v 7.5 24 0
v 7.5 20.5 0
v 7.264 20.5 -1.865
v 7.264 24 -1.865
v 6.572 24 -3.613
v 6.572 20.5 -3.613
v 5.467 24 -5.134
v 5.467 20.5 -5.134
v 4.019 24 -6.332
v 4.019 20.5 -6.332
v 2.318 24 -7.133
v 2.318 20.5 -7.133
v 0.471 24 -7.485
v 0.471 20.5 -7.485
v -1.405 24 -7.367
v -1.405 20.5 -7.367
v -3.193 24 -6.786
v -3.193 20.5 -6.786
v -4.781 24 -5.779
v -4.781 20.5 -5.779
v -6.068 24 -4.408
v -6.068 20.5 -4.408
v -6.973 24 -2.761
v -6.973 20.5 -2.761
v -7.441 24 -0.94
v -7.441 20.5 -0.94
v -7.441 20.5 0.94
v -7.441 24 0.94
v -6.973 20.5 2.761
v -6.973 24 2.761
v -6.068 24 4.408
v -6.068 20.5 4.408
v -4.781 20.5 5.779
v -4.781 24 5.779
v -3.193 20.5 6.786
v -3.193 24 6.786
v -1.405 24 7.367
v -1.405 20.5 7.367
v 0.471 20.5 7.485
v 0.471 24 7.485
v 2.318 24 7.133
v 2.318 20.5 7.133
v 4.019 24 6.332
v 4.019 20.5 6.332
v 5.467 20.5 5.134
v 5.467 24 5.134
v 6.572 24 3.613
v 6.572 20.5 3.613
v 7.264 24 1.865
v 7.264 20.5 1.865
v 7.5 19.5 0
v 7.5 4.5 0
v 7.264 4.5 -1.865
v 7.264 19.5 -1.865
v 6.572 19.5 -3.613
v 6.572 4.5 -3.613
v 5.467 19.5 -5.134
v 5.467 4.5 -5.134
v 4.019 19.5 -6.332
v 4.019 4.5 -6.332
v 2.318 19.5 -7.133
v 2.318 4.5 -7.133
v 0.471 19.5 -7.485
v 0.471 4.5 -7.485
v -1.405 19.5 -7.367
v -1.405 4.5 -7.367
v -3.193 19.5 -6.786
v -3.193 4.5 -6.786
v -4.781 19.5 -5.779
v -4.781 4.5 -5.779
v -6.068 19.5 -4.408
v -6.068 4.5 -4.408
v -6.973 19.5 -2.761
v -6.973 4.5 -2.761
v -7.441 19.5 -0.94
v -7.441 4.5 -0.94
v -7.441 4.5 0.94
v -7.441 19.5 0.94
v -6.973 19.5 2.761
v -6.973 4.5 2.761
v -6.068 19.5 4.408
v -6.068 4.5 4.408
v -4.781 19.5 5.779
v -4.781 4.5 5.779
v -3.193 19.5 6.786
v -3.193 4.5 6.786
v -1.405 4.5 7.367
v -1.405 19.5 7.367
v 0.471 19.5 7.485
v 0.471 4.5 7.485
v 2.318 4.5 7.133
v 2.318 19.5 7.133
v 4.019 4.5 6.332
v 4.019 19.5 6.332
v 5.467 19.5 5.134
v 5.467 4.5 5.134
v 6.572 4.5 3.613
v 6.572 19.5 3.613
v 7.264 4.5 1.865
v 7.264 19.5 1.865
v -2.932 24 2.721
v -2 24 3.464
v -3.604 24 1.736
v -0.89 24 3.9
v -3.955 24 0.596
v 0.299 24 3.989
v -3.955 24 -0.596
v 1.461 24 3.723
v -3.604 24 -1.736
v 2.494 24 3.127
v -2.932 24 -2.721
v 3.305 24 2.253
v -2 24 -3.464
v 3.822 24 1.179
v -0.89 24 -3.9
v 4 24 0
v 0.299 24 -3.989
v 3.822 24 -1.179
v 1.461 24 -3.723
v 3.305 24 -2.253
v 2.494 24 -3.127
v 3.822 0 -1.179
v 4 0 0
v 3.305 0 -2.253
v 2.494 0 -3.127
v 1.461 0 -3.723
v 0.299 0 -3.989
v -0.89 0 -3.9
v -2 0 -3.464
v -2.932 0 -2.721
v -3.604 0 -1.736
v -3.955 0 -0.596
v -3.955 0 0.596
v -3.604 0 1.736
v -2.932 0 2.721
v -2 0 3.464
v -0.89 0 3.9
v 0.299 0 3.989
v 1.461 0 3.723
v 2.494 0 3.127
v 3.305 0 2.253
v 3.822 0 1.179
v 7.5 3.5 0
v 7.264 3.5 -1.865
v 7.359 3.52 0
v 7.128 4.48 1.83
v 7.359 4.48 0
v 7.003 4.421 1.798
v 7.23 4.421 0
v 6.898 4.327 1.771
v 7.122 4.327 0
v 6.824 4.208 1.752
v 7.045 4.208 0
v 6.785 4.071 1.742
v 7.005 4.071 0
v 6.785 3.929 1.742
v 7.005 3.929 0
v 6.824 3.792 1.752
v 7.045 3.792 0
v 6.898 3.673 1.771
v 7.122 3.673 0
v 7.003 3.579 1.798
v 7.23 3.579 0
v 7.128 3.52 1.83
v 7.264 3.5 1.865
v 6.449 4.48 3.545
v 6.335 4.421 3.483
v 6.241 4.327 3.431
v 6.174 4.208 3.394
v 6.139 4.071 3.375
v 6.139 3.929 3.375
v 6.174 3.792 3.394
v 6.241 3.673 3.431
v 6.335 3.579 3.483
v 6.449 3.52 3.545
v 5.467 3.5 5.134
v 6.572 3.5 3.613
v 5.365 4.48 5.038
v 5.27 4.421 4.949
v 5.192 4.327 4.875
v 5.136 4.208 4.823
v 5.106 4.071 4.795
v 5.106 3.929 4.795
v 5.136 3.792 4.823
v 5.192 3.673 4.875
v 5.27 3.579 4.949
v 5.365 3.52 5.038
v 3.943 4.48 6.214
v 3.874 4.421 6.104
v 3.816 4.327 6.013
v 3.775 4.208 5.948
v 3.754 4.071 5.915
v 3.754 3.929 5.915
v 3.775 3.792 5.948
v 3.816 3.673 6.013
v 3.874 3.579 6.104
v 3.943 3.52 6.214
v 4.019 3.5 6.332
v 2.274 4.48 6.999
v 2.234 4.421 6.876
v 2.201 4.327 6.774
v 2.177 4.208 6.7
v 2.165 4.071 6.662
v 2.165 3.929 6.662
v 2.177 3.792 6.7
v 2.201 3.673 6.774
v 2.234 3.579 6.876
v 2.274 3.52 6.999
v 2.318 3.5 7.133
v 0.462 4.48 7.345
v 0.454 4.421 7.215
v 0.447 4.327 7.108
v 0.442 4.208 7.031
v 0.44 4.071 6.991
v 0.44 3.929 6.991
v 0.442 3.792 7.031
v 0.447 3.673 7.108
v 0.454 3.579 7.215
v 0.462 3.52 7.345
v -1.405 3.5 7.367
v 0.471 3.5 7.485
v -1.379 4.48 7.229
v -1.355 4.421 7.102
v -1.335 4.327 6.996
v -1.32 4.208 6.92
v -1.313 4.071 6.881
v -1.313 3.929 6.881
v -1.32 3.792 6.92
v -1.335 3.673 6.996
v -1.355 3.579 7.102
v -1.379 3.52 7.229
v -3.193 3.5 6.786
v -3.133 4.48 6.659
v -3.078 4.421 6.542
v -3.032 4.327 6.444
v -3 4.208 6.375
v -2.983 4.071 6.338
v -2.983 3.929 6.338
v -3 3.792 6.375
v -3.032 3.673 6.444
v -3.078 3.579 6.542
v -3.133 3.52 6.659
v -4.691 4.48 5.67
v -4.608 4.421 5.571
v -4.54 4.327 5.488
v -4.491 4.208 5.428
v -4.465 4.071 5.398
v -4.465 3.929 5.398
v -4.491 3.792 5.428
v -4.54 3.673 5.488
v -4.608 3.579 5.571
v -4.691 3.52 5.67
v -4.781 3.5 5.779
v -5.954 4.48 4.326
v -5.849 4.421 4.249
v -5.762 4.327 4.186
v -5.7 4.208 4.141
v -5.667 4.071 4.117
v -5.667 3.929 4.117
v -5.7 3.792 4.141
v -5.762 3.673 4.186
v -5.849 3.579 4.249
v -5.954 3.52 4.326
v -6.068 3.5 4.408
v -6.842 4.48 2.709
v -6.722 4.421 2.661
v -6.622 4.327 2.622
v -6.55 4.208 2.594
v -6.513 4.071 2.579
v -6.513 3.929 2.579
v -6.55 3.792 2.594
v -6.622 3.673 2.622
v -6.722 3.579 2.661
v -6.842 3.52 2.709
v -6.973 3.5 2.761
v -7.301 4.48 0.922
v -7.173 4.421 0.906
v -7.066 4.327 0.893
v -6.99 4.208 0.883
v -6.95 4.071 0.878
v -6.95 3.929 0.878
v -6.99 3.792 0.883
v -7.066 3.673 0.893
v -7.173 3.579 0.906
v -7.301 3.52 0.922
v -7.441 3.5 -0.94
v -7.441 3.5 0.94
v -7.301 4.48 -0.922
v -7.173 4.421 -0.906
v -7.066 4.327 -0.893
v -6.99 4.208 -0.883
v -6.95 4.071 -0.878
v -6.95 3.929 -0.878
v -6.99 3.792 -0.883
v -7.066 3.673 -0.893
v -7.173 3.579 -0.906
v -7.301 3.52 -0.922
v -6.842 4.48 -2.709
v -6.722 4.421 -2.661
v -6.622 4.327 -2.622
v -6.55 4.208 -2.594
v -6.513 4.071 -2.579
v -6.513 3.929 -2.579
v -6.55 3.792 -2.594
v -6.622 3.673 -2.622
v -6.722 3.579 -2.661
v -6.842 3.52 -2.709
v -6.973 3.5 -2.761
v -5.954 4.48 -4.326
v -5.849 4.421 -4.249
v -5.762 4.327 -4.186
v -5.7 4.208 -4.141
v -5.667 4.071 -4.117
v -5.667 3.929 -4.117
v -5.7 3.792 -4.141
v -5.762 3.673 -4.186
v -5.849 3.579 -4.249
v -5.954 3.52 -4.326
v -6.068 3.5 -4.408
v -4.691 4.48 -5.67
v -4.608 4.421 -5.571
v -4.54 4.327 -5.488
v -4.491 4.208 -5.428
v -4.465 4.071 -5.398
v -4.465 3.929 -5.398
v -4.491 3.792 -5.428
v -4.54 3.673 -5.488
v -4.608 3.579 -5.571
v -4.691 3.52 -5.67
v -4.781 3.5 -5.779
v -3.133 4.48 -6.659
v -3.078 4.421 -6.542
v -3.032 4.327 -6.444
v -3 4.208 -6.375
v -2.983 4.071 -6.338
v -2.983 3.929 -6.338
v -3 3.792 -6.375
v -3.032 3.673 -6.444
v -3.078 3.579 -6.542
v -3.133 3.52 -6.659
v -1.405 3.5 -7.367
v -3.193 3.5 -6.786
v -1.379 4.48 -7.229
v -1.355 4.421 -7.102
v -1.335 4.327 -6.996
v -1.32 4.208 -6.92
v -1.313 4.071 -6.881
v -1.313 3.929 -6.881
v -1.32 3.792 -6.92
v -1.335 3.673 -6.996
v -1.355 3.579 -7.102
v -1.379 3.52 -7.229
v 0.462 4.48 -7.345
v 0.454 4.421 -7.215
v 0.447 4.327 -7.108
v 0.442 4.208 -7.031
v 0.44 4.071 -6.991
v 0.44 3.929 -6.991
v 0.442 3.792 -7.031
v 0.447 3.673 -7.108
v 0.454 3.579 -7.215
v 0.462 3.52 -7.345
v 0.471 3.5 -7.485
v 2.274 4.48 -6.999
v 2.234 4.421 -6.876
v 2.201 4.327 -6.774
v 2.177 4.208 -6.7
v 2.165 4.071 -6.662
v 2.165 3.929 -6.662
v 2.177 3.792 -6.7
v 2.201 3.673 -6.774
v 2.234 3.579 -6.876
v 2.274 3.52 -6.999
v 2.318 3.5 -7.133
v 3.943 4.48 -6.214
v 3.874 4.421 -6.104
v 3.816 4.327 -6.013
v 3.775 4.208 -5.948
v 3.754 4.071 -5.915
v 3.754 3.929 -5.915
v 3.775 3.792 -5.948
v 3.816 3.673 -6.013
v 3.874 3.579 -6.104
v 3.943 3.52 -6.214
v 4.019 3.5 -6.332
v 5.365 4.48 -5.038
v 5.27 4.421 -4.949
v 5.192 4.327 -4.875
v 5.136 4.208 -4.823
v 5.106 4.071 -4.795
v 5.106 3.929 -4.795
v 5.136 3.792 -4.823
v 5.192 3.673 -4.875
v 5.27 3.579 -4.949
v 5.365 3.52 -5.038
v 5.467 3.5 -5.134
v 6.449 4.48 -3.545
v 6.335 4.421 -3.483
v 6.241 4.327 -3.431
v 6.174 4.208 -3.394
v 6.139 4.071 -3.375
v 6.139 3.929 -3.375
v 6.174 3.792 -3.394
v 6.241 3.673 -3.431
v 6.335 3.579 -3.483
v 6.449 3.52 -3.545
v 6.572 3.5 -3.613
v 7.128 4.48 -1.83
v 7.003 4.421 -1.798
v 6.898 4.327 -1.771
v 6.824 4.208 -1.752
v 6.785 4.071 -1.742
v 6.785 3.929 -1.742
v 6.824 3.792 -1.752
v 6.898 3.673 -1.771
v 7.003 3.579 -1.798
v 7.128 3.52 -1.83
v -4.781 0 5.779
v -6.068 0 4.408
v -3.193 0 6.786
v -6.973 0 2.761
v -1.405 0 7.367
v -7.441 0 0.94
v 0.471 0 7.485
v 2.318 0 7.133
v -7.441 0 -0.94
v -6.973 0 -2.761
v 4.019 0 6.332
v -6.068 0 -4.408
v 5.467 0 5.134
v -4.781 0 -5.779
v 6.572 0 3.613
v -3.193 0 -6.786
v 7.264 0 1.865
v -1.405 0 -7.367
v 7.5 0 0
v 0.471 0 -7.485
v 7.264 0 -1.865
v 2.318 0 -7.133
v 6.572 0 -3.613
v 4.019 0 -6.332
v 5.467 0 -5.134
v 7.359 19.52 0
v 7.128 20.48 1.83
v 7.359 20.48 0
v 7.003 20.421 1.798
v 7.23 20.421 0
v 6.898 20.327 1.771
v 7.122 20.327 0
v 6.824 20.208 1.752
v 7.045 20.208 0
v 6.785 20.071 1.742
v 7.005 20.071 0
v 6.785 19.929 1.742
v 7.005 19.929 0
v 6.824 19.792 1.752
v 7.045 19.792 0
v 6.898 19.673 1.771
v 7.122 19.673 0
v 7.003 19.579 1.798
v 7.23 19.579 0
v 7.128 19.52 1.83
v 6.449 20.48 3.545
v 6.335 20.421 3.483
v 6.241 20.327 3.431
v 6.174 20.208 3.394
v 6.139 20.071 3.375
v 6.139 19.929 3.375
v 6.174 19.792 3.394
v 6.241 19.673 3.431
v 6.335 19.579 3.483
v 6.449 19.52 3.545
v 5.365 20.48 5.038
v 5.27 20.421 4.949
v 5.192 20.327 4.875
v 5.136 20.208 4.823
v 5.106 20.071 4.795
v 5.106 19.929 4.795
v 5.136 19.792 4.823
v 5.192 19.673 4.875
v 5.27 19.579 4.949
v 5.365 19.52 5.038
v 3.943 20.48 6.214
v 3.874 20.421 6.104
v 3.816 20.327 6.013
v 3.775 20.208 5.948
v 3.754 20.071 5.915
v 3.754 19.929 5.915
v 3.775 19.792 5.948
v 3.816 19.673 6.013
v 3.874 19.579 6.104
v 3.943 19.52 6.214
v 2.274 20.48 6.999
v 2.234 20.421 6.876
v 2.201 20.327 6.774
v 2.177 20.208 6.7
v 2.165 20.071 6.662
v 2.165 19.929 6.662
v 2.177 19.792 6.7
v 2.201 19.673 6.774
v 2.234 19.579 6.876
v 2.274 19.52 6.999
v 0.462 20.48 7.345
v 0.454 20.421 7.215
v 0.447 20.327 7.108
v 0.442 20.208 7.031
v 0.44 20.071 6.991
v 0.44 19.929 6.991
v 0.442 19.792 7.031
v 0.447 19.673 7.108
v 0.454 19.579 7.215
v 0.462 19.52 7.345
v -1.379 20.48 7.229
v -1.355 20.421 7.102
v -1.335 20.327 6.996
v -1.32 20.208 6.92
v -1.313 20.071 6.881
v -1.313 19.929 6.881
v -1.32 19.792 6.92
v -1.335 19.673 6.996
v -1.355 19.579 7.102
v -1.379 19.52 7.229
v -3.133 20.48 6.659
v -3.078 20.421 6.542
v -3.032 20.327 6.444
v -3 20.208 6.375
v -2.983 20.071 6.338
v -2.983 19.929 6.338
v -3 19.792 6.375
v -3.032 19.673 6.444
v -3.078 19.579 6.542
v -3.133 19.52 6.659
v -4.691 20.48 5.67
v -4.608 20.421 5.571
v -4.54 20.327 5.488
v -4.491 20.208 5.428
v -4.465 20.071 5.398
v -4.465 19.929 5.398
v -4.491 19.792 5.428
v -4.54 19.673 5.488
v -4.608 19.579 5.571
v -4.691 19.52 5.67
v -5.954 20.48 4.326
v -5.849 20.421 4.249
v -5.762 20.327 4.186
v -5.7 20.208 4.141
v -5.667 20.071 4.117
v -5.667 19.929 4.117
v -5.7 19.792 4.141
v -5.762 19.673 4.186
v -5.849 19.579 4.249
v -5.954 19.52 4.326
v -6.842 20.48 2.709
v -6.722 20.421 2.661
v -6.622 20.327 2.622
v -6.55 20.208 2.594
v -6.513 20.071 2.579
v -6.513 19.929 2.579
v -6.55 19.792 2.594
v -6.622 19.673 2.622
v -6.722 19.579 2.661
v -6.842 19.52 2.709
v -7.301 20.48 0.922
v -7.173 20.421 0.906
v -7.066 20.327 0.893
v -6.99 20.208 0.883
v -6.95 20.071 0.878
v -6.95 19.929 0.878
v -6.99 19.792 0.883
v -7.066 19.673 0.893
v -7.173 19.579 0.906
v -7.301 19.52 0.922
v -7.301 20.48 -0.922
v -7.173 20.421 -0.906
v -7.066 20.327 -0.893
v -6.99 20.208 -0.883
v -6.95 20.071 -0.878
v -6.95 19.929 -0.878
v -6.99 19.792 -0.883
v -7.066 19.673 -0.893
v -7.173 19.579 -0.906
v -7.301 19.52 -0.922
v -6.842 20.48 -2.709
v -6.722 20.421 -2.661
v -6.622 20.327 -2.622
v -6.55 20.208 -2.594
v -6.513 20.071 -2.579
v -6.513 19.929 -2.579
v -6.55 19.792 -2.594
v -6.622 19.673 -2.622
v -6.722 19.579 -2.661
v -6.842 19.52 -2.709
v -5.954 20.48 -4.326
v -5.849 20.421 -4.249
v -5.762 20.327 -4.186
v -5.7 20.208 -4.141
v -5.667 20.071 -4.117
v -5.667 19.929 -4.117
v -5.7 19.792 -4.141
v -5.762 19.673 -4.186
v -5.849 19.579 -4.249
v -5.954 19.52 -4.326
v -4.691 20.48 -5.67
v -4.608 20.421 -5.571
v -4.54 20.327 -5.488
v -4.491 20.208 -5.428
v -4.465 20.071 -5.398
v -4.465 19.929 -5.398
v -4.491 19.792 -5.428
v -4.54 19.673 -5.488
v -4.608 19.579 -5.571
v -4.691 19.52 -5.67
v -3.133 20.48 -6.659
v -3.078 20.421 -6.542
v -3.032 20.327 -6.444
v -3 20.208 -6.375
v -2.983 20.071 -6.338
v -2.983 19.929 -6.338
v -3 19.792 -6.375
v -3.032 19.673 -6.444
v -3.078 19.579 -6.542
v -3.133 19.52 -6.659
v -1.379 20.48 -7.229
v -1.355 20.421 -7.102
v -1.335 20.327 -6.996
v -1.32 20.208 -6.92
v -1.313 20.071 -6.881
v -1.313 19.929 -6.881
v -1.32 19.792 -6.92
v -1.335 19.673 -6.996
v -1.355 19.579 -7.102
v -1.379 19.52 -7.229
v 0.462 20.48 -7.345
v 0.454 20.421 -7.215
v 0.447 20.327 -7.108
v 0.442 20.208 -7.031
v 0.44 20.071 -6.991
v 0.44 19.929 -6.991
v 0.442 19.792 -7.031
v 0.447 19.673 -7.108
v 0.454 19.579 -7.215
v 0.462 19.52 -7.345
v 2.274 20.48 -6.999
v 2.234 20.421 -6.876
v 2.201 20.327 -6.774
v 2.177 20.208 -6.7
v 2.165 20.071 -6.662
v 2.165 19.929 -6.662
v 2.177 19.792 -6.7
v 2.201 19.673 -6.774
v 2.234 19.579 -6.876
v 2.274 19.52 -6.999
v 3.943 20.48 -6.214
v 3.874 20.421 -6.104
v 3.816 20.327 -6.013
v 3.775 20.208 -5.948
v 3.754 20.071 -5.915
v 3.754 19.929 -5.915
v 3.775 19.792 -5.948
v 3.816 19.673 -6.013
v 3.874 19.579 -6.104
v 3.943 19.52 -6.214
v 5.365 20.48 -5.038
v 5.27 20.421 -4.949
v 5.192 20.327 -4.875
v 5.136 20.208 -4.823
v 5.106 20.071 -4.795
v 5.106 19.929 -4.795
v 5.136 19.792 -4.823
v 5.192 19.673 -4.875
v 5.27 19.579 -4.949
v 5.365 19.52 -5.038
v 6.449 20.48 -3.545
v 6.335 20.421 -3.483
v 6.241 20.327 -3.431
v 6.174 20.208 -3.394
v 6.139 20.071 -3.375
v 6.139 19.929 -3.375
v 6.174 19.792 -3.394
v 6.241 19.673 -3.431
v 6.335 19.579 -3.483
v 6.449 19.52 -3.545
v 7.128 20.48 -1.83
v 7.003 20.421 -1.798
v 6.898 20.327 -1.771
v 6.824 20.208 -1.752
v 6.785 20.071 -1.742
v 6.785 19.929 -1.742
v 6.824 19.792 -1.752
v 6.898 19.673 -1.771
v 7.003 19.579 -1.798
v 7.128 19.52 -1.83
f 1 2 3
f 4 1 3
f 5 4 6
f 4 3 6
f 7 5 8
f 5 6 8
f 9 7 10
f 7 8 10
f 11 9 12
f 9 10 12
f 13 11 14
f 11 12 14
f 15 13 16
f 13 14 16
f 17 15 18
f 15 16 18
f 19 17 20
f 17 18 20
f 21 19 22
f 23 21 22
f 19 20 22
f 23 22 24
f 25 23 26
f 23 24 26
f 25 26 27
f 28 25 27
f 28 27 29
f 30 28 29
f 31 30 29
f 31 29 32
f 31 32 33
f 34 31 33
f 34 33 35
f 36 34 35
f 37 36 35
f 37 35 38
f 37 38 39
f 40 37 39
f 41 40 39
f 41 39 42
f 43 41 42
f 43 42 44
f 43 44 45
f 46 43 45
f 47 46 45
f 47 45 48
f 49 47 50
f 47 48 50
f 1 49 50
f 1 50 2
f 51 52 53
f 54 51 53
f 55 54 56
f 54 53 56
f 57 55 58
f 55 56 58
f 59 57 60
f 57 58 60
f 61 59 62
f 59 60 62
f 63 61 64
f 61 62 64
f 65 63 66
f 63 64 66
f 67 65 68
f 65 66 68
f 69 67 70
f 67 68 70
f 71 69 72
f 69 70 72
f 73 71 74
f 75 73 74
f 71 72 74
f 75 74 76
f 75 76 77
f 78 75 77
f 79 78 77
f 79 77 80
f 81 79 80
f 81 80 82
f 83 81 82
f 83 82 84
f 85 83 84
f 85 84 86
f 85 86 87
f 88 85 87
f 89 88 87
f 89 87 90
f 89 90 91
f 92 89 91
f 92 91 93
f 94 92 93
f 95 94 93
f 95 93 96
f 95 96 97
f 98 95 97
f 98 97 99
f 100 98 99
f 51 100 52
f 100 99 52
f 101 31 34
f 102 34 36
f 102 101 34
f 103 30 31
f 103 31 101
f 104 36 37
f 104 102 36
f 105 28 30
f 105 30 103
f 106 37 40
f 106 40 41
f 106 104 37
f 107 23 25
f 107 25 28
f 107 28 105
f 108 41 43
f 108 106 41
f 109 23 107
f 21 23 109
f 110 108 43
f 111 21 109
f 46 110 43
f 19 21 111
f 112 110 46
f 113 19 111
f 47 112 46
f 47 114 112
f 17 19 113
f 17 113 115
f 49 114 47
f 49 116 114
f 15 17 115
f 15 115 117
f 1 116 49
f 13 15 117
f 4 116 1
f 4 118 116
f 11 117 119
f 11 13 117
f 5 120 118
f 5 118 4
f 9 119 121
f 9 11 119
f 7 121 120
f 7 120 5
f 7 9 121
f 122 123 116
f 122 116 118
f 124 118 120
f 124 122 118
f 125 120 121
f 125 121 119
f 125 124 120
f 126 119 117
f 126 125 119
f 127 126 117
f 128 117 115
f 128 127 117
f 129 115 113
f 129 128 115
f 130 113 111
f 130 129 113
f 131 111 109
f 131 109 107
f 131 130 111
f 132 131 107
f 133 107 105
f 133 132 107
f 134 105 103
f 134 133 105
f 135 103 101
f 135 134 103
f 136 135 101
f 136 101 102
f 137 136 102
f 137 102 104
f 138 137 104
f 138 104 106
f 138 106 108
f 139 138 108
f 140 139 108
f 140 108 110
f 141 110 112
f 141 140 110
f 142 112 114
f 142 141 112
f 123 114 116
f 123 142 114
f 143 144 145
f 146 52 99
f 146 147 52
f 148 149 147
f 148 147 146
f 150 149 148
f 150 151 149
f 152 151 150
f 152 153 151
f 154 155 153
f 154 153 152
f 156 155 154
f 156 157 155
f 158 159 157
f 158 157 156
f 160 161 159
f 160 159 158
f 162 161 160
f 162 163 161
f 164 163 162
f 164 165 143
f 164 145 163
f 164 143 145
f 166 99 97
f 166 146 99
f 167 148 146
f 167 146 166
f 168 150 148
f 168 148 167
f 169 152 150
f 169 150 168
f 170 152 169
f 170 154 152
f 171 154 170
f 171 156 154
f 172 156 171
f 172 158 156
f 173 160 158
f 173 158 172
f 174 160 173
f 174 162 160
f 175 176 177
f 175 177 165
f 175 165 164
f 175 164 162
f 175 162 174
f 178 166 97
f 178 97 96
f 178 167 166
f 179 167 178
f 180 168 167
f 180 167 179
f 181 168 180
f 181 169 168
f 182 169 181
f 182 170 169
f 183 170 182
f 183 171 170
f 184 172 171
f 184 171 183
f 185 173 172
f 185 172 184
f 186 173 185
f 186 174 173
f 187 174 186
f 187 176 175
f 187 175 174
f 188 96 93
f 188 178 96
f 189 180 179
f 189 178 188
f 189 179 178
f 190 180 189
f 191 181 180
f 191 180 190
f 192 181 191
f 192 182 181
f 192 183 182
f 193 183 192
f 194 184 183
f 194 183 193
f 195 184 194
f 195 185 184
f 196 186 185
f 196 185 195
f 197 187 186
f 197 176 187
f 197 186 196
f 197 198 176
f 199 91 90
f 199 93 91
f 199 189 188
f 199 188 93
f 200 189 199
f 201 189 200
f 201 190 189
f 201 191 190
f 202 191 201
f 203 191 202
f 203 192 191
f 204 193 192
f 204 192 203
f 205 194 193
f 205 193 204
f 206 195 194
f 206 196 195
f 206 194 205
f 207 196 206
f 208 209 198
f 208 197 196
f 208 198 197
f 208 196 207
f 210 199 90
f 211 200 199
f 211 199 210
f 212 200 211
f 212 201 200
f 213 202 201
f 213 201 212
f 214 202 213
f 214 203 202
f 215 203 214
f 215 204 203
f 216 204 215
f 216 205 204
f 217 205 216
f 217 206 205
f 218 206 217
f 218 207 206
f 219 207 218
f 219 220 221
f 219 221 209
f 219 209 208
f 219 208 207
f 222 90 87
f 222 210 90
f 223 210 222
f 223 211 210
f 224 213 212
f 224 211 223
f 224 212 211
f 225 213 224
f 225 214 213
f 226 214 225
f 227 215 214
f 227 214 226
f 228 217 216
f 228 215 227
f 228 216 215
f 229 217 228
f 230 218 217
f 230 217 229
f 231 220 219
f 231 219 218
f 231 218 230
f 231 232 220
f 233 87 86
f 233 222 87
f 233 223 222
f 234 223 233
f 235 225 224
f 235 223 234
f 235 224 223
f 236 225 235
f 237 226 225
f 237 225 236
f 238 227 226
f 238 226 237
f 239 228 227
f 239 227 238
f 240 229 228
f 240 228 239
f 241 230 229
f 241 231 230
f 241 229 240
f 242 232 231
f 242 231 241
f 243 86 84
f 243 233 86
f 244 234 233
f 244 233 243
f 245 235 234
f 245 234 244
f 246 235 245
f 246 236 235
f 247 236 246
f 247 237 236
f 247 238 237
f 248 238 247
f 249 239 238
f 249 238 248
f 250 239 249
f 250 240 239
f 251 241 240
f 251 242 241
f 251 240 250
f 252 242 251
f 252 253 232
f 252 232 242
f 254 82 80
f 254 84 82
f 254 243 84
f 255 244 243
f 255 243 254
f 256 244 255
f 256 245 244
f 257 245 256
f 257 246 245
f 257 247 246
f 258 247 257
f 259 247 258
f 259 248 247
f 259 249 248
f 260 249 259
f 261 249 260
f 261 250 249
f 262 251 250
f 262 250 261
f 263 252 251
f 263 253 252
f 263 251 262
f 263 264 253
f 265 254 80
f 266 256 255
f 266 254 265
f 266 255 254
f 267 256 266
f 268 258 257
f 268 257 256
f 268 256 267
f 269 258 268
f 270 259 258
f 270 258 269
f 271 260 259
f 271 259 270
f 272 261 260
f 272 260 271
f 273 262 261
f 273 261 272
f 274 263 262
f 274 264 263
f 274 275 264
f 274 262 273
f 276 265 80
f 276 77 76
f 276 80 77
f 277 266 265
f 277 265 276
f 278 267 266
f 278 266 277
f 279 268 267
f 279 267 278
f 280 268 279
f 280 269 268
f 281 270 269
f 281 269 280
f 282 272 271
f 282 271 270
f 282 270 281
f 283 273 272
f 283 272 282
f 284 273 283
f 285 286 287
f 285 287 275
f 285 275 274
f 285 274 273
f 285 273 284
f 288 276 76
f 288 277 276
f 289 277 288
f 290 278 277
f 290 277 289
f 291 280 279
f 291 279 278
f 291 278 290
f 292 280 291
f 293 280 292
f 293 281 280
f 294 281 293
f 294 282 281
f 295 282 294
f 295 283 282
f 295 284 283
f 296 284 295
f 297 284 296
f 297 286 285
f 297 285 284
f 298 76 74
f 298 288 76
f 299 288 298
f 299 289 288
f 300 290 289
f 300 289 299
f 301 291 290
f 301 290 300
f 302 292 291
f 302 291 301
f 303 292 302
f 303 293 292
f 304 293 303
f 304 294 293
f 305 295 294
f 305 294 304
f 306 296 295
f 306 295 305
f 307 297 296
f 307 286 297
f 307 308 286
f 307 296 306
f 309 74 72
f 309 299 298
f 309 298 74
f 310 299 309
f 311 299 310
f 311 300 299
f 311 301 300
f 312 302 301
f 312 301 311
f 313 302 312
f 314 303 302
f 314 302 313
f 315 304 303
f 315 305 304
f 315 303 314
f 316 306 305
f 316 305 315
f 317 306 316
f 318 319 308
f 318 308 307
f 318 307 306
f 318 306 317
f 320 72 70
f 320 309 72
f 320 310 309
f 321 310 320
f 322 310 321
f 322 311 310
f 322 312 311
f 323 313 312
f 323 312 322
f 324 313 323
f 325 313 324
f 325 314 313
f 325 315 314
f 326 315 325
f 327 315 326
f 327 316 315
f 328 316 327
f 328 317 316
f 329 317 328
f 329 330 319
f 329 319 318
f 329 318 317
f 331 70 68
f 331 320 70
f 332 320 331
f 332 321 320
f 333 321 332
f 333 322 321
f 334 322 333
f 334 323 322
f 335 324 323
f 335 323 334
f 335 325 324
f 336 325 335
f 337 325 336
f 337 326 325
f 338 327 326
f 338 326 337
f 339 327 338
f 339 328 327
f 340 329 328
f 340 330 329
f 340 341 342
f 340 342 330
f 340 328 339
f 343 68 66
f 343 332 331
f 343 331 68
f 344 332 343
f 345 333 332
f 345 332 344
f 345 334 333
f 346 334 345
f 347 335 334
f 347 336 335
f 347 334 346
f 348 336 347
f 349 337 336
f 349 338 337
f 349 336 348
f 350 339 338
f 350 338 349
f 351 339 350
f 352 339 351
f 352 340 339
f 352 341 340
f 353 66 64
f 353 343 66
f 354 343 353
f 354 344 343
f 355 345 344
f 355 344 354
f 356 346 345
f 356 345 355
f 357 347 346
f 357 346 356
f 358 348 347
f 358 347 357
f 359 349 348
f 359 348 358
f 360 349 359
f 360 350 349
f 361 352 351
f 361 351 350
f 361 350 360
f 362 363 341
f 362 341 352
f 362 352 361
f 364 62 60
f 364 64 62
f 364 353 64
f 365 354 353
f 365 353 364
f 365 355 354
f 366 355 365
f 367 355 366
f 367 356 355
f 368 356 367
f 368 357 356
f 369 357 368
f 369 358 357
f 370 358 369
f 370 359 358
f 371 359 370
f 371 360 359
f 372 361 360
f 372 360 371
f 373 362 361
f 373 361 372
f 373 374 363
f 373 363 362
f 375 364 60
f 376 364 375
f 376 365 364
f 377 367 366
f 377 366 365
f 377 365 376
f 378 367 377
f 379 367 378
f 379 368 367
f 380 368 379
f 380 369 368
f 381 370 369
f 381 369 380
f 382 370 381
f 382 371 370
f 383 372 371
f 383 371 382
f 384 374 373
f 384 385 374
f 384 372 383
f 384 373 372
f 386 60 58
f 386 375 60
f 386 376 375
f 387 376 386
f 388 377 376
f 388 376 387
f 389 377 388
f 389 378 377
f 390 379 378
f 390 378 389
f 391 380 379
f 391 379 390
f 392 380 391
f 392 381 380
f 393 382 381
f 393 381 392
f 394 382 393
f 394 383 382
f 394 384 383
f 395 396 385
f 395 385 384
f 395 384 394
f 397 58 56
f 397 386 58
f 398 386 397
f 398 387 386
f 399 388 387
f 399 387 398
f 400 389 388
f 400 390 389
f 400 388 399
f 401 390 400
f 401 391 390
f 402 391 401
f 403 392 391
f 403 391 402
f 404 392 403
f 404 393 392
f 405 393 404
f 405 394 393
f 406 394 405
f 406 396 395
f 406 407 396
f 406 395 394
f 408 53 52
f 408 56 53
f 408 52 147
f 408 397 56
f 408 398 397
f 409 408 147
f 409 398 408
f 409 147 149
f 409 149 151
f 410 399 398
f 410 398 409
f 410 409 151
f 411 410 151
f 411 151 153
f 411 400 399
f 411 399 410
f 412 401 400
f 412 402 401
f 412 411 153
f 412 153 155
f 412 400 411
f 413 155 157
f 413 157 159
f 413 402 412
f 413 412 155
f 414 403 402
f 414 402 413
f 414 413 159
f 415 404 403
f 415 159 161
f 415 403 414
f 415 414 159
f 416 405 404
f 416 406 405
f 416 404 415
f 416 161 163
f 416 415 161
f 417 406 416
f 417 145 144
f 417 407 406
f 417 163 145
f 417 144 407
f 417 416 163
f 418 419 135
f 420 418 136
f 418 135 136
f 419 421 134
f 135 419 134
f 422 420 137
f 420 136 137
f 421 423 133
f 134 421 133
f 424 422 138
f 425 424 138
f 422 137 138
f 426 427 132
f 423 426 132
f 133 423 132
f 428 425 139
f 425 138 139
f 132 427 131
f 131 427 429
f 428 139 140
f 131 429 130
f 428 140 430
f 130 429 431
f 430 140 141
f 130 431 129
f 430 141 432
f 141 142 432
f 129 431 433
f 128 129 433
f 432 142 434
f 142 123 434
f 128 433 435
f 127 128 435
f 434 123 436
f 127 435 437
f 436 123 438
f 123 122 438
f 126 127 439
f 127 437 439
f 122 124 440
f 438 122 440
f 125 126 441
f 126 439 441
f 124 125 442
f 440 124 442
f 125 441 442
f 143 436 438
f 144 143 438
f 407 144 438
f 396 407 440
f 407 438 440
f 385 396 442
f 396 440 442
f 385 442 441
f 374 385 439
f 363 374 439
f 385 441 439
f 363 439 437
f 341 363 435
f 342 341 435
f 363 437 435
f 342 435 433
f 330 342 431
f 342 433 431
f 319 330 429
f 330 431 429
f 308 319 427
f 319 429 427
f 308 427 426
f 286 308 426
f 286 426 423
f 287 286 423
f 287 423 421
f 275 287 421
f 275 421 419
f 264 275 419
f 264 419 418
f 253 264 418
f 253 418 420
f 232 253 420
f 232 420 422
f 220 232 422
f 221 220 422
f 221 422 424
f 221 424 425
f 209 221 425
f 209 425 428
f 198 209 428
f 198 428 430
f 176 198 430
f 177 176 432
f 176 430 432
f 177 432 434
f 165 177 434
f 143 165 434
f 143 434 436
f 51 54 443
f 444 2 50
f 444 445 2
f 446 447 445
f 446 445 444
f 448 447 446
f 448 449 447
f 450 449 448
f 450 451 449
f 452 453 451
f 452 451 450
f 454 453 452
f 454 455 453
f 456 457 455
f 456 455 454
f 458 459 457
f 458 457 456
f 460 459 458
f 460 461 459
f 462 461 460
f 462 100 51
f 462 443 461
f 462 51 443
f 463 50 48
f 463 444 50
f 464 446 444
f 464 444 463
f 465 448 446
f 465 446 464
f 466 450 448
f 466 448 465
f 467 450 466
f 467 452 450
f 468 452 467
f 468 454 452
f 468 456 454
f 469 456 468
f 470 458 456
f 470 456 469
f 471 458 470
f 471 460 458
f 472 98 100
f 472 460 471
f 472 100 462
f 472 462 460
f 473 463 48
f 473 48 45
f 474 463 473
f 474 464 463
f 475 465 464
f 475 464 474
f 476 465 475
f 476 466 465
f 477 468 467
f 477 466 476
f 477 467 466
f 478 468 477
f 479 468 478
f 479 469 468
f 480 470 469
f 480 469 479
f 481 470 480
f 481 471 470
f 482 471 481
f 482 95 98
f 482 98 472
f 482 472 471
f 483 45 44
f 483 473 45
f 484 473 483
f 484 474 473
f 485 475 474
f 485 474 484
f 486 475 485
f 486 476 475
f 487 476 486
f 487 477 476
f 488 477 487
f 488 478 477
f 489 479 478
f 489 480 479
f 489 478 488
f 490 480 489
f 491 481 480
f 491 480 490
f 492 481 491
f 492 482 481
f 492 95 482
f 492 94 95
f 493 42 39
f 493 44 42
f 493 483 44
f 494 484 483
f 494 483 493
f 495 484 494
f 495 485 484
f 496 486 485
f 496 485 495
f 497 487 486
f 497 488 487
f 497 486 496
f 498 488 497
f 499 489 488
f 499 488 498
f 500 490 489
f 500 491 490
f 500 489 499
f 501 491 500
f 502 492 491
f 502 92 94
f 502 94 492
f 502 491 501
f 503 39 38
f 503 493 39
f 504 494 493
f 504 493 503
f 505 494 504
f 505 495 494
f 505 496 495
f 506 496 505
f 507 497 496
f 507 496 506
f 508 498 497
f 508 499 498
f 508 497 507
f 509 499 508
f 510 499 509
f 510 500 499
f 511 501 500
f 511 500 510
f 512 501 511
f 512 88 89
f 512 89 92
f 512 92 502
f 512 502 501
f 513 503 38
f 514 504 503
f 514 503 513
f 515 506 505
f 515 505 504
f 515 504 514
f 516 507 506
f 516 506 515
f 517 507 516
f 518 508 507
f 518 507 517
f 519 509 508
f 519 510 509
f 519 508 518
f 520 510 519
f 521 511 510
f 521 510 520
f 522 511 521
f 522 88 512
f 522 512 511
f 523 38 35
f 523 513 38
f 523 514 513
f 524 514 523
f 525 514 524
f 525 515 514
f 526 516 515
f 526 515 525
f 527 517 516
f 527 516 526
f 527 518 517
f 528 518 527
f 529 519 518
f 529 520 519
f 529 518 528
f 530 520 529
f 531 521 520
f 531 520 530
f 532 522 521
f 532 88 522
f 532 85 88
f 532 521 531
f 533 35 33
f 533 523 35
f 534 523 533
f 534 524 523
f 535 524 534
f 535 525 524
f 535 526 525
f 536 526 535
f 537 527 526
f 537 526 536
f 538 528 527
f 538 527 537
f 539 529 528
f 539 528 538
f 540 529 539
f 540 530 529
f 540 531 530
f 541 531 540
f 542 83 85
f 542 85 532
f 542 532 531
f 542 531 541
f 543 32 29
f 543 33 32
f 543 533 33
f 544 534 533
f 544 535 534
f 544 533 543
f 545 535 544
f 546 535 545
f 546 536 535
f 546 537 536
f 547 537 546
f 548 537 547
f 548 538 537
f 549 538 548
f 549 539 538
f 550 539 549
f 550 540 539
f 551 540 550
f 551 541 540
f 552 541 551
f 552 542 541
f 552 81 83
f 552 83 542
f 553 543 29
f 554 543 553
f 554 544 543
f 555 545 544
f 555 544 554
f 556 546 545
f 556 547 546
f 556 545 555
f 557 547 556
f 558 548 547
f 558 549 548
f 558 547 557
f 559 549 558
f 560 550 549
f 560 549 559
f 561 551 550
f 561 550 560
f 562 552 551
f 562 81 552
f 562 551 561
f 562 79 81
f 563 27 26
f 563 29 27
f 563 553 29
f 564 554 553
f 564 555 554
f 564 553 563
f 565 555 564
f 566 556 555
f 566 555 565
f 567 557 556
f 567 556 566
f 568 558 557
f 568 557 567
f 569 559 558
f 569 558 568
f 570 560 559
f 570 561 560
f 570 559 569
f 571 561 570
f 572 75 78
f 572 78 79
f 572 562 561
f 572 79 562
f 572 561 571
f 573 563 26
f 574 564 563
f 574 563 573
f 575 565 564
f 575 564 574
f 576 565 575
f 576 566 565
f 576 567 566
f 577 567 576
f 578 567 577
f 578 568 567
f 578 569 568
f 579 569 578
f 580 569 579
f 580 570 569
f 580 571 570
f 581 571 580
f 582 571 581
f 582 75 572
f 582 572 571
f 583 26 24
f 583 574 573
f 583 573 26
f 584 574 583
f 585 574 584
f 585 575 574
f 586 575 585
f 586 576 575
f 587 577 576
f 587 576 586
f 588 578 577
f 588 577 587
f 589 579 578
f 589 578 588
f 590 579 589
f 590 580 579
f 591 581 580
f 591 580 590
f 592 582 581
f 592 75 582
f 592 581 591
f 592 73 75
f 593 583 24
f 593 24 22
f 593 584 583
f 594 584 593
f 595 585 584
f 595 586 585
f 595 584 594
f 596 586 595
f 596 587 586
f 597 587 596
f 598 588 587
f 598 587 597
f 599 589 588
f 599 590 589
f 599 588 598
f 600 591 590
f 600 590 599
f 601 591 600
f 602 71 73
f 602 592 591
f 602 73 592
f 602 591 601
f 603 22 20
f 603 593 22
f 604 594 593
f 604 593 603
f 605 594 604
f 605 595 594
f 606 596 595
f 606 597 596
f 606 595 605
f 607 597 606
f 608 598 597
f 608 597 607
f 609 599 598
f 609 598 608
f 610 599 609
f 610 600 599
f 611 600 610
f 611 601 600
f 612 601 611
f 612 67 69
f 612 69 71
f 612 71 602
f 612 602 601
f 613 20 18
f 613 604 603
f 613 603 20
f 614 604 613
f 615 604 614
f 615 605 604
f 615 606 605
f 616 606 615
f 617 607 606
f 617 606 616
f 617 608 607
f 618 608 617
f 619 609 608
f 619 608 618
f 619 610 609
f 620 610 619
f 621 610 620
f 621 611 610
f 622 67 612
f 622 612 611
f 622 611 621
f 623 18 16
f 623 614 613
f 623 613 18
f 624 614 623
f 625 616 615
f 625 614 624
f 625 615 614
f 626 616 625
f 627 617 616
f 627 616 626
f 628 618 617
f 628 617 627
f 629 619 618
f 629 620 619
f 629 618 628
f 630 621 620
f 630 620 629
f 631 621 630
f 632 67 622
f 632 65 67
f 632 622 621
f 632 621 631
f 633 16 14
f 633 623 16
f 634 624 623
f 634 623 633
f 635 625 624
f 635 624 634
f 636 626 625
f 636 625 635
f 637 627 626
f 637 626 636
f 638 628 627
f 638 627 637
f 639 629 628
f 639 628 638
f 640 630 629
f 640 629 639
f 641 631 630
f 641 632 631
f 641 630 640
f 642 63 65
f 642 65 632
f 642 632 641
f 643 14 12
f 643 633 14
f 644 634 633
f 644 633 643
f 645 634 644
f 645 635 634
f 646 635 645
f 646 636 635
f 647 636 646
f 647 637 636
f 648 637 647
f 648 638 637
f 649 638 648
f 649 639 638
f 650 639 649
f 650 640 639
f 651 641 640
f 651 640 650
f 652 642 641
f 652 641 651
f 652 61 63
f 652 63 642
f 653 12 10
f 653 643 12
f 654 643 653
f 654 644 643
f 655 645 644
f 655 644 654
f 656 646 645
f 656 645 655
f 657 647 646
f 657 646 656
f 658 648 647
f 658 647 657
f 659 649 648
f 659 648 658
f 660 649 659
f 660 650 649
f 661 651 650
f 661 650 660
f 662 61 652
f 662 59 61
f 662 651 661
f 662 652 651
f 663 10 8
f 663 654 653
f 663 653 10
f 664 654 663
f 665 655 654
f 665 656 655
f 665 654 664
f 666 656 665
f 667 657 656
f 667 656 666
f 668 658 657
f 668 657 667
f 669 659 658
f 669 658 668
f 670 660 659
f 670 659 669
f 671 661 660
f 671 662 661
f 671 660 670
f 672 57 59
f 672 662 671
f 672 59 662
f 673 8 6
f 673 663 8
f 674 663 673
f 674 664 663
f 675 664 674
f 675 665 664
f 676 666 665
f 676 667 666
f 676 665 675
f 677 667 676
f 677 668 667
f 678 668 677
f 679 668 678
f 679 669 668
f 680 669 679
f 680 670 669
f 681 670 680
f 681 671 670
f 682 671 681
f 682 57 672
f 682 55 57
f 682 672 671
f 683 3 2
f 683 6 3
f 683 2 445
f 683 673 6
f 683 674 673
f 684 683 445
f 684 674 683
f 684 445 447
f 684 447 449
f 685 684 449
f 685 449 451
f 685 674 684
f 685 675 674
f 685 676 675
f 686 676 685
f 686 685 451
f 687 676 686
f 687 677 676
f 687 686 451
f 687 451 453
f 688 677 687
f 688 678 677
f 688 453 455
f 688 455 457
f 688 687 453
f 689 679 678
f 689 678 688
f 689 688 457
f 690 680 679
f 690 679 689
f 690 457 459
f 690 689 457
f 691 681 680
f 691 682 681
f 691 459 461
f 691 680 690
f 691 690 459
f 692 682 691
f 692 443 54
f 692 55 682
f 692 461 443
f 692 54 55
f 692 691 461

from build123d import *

# Parameters (mm, degrees)
SKETCH1_R           = 7.5
SKETCH1_R_2         = 4
BOSS_EXTRUDE1_DEPTH = 24
SKETCH2_R           = 0.5


with BuildPart() as part:
    # Sketch1 → Boss-Extrude1 (new body)
    with BuildSketch(Plane(origin=(0, 0, 0), x_dir=(1, 0, 0), z_dir=(0, 1, 0))):
        Circle(SKETCH1_R)
        Circle(SKETCH1_R_2, mode=Mode.SUBTRACT)
    extrude(amount=BOSS_EXTRUDE1_DEPTH)

    # Sketch2 → Cut-Revolve1 (revolve, cut)
    with BuildSketch(Plane.XY):
        with Locations((7.5, 4)):
            Circle(SKETCH2_R)
        with Locations((7.5, 20)):
            Circle(SKETCH2_R)
    revolve(axis=Axis((0, 20.782039023, 0), (0, -1, 0)), mode=Mode.SUBTRACT)


solid = part.part
